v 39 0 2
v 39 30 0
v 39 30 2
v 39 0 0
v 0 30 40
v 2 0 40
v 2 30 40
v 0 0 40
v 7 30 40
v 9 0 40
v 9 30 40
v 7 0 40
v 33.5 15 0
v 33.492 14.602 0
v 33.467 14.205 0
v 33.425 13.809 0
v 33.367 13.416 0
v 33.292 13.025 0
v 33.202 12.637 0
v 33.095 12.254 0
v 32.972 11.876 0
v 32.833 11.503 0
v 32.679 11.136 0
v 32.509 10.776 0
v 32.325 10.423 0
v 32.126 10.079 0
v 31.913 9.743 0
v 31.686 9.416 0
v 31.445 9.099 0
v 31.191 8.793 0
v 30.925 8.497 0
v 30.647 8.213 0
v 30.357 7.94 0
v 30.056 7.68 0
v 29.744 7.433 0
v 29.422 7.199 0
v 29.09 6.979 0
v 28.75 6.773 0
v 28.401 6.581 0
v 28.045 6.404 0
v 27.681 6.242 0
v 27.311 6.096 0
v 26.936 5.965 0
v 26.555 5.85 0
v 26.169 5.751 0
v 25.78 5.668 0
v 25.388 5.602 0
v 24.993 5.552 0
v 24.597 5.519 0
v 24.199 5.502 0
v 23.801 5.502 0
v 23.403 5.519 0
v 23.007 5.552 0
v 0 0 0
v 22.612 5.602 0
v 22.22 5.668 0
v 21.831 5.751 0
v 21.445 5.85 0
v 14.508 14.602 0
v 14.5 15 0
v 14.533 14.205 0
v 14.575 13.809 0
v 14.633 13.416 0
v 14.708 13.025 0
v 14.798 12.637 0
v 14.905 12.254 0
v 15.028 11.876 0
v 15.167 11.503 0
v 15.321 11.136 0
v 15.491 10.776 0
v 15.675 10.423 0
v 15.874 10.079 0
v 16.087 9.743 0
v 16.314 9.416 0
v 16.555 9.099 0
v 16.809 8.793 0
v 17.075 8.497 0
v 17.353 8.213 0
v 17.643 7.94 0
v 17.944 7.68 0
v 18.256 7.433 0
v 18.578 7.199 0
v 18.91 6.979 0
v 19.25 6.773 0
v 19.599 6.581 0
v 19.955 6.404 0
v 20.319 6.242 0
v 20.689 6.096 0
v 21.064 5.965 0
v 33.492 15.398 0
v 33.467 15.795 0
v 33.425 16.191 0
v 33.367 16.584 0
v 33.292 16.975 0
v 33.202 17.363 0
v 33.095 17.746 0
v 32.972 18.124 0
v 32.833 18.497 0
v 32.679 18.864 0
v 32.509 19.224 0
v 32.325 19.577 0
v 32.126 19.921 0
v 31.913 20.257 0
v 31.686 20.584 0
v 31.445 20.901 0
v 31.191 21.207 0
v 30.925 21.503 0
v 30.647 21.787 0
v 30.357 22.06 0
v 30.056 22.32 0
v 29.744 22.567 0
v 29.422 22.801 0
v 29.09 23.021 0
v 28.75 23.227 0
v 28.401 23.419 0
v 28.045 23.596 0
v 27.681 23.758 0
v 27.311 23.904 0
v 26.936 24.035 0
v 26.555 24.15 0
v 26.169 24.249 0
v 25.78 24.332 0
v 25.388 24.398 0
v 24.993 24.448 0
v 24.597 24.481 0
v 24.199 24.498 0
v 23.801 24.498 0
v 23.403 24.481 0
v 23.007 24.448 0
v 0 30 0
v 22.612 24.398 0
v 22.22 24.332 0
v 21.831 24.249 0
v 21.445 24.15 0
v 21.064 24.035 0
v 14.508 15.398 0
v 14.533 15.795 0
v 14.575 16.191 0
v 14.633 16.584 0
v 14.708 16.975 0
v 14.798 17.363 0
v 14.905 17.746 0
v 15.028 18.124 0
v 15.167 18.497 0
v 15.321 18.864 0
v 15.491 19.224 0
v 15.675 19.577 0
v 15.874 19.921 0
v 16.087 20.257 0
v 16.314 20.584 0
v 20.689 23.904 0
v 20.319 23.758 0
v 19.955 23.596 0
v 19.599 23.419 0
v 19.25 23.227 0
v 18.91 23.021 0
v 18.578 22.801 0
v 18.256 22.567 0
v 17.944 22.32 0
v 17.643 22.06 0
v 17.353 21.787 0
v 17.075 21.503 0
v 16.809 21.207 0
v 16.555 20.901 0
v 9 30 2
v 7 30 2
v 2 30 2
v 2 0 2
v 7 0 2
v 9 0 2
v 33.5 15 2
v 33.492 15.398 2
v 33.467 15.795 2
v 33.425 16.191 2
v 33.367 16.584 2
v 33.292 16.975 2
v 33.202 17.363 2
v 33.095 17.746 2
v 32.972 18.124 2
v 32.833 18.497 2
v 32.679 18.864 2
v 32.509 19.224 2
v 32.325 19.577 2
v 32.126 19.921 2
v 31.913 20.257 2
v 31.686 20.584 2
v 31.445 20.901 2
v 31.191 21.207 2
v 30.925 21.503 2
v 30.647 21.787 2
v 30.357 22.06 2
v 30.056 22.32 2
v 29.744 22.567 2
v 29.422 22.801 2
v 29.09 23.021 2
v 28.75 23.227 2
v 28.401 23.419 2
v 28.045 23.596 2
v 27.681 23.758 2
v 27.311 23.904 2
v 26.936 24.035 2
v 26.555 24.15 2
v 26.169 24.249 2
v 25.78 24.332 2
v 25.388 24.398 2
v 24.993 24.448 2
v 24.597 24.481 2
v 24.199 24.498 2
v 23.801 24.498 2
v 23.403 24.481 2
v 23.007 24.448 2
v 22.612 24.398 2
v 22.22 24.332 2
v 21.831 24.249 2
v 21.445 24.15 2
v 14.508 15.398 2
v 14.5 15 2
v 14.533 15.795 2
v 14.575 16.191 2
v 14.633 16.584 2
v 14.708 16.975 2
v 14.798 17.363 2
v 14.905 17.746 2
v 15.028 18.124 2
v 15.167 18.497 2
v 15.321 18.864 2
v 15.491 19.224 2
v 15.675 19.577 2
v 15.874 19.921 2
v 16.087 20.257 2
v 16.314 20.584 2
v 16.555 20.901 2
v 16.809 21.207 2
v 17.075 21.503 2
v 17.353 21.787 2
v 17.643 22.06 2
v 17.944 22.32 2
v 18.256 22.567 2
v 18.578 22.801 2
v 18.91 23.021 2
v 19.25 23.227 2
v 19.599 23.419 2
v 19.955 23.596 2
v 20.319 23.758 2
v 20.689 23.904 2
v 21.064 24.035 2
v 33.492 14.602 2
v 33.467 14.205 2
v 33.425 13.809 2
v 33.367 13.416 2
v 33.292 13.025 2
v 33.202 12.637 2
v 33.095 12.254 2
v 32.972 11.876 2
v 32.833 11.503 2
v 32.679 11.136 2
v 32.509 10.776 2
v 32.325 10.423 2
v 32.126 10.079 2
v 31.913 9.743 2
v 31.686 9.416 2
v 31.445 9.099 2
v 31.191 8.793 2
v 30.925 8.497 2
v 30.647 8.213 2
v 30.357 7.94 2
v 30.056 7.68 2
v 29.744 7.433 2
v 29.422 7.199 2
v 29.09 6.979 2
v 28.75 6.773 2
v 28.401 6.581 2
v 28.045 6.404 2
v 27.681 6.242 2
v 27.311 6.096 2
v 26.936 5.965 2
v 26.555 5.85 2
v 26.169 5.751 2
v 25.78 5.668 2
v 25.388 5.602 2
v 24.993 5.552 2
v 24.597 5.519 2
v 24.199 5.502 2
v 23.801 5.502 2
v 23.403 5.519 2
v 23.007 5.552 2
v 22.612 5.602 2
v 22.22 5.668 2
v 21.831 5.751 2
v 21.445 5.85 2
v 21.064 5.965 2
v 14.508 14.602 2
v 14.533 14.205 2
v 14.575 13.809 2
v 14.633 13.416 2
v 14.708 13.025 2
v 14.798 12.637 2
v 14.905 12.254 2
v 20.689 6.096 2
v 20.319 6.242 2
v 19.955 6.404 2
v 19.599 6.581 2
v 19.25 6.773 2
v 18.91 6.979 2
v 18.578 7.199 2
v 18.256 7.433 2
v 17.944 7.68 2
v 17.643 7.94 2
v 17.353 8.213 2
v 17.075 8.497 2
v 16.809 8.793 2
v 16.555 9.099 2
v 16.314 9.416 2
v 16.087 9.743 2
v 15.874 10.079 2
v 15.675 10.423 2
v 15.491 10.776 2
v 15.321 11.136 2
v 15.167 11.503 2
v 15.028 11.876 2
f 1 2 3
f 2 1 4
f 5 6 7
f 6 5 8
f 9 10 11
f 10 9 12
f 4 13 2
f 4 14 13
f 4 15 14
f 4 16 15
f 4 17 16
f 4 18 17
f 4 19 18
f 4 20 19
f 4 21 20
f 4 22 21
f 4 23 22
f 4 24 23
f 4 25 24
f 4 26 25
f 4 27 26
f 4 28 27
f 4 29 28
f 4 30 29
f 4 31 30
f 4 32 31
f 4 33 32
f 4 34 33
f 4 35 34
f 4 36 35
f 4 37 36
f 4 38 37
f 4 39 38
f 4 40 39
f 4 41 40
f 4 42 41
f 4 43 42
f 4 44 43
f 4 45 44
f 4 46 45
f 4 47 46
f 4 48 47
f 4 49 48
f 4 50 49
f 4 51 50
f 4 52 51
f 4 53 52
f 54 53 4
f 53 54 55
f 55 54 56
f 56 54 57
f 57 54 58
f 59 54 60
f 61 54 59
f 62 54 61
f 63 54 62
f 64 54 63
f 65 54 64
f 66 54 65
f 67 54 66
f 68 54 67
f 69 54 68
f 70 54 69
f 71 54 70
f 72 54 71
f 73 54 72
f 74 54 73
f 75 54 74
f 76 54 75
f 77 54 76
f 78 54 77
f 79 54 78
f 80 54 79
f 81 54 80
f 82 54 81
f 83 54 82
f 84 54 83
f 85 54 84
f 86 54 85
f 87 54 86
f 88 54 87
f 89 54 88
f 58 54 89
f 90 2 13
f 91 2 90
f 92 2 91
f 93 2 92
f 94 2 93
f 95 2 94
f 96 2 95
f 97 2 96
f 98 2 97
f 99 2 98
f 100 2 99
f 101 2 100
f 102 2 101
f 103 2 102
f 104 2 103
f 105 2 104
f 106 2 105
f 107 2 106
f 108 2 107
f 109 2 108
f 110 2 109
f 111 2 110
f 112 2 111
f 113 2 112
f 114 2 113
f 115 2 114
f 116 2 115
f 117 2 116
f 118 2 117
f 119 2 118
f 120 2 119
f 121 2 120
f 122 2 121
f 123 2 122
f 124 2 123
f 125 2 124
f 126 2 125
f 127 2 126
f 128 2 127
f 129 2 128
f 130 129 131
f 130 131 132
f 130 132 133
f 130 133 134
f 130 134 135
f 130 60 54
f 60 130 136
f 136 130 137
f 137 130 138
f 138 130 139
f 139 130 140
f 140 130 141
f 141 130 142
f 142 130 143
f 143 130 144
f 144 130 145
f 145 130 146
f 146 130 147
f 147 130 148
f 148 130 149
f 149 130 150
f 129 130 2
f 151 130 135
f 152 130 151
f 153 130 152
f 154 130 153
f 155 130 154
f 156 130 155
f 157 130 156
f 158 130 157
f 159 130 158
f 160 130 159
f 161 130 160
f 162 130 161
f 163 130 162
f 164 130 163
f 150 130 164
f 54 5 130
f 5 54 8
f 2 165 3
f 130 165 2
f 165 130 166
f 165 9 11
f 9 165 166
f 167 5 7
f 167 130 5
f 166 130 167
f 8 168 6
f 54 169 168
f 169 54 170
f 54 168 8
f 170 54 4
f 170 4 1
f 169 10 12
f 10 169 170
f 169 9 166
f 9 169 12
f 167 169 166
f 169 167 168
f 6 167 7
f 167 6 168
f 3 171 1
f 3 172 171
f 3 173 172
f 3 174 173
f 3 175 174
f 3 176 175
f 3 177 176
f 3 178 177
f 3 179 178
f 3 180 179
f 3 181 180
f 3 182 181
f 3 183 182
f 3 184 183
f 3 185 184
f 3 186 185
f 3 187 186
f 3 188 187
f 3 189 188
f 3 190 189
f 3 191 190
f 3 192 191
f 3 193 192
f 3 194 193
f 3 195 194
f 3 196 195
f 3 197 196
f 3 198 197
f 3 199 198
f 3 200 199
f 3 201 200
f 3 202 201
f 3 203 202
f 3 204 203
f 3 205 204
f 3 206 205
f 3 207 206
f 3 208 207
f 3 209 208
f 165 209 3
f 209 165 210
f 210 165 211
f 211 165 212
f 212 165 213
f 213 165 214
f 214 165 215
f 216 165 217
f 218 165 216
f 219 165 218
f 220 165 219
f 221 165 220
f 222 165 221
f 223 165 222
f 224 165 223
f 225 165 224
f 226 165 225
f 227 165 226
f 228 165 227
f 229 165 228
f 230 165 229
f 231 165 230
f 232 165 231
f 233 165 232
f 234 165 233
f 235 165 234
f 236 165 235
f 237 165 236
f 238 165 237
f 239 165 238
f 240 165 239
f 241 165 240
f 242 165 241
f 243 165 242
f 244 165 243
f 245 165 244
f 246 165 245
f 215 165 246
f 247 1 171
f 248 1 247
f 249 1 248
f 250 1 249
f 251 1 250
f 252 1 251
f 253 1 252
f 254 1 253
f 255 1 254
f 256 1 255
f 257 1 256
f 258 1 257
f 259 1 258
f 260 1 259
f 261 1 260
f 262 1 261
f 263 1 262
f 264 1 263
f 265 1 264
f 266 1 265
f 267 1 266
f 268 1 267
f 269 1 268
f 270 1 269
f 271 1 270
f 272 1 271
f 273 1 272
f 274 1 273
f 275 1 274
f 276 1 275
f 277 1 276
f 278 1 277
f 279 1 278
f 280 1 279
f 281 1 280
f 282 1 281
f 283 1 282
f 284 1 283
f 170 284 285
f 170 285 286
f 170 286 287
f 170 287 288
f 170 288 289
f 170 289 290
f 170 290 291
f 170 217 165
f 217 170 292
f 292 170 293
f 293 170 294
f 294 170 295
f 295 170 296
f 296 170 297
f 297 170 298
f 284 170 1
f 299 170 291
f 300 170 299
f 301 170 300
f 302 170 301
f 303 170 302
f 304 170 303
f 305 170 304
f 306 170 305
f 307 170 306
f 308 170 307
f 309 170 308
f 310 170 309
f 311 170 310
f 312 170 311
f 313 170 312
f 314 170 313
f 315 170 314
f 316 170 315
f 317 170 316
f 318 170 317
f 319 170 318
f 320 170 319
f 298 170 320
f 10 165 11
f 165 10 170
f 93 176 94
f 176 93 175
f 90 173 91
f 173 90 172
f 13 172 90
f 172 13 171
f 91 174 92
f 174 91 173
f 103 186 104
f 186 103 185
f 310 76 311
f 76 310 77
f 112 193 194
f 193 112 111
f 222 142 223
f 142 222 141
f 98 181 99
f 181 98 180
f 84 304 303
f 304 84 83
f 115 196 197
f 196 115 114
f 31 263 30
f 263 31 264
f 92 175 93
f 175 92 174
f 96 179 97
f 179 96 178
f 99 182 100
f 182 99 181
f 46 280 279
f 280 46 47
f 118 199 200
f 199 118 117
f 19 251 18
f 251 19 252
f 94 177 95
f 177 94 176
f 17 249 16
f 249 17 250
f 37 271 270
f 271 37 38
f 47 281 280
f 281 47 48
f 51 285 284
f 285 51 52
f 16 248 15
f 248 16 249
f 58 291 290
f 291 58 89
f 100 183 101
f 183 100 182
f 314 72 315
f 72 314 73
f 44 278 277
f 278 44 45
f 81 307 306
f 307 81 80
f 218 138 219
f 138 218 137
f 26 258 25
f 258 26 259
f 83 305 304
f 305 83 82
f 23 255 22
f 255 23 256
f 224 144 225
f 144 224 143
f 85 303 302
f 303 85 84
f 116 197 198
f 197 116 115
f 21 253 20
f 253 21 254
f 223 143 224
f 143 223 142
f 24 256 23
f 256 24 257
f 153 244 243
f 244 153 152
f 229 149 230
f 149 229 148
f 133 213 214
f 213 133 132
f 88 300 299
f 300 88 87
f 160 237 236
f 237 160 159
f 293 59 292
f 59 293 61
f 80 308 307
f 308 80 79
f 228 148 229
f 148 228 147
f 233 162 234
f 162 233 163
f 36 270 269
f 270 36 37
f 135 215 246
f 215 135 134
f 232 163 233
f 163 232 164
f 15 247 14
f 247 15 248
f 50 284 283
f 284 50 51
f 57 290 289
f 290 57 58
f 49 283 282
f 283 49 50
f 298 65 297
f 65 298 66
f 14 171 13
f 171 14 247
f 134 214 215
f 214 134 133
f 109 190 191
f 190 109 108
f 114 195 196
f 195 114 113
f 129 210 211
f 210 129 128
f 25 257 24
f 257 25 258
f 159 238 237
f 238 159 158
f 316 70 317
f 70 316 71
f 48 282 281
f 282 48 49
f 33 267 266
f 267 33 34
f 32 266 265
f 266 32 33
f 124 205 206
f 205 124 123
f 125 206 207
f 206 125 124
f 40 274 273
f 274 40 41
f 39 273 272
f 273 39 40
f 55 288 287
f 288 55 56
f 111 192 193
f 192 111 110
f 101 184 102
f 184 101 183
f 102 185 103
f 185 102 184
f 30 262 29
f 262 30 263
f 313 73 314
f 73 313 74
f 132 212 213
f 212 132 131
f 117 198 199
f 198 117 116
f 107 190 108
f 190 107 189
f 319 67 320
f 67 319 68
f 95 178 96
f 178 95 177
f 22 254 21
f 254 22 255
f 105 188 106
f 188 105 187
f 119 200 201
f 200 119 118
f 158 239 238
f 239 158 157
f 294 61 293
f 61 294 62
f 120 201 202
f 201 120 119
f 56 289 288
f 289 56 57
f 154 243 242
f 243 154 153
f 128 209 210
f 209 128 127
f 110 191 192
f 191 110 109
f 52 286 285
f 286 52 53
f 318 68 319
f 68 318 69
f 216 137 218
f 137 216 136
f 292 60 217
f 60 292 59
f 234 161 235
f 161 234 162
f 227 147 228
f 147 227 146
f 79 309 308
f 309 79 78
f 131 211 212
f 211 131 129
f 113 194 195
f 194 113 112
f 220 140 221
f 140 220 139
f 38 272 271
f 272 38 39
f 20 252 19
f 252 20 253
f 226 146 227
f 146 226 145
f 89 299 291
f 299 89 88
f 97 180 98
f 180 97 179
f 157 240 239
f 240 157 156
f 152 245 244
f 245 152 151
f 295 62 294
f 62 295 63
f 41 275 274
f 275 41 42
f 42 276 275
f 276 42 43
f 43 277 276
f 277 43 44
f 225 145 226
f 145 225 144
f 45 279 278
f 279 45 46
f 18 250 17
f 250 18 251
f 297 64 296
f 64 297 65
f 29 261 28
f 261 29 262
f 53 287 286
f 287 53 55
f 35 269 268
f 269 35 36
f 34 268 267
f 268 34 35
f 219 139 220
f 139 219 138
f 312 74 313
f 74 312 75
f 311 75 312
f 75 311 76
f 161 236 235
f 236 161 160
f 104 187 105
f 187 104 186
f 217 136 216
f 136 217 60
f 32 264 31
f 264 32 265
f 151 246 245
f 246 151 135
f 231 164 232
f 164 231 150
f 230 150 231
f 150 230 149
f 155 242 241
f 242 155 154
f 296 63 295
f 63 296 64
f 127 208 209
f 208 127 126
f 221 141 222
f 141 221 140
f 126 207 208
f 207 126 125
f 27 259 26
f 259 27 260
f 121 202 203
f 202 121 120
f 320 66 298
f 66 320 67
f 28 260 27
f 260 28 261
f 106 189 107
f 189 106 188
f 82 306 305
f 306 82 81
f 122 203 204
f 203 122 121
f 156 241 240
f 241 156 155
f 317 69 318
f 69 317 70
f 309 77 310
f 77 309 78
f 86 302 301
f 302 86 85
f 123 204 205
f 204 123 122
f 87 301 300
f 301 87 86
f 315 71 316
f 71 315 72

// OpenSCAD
/*
toothbrushHolderWithClip
****************************************

With square toothbrush holder and a clip that intent to be on top of metal frame of the shampoo holder
*/

// Resolution variables
$fa = 1;
$fs = 0.4;

// Main dimension variables

hightZ = 40;
holderGapX = 5; //The place that will on top of the metal bar
toothbrushHolderLengthWidth = 30;
wallThikness = 2;
holeForToothbrushD = 19;

// Calculated vareables

fullBodyLengthX = (wallThikness * 2) + holderGapX + toothbrushHolderLengthWidth;
holeForToothbrushR = holeForToothbrushD / 2;

// Main

module toothbrushHolderWithClip(){
    difference(){
        cube([fullBodyLengthX, toothbrushHolderLengthWidth, hightZ]);

        // Clip
        translate([wallThikness, -1, wallThikness])
            cube([holderGapX, toothbrushHolderLengthWidth * 2, hightZ * 2]);

        // Toothbrush holder
        translate([fullBodyLengthX - toothbrushHolderLengthWidth
    , -1, wallThikness])
            cube([toothbrushHolderLengthWidth * 2, toothbrushHolderLengthWidth * 2, hightZ * 2]);

        // Toothbrush holder hole
        translate([fullBodyLengthX - (toothbrushHolderLengthWidth / 2),toothbrushHolderLengthWidth / 2, -1])
            cylinder(r = holeForToothbrushR, h = wallThikness * 2);
    }
}

// Generate the toothbrush holder with clip
toothbrushHolderWithClip();
